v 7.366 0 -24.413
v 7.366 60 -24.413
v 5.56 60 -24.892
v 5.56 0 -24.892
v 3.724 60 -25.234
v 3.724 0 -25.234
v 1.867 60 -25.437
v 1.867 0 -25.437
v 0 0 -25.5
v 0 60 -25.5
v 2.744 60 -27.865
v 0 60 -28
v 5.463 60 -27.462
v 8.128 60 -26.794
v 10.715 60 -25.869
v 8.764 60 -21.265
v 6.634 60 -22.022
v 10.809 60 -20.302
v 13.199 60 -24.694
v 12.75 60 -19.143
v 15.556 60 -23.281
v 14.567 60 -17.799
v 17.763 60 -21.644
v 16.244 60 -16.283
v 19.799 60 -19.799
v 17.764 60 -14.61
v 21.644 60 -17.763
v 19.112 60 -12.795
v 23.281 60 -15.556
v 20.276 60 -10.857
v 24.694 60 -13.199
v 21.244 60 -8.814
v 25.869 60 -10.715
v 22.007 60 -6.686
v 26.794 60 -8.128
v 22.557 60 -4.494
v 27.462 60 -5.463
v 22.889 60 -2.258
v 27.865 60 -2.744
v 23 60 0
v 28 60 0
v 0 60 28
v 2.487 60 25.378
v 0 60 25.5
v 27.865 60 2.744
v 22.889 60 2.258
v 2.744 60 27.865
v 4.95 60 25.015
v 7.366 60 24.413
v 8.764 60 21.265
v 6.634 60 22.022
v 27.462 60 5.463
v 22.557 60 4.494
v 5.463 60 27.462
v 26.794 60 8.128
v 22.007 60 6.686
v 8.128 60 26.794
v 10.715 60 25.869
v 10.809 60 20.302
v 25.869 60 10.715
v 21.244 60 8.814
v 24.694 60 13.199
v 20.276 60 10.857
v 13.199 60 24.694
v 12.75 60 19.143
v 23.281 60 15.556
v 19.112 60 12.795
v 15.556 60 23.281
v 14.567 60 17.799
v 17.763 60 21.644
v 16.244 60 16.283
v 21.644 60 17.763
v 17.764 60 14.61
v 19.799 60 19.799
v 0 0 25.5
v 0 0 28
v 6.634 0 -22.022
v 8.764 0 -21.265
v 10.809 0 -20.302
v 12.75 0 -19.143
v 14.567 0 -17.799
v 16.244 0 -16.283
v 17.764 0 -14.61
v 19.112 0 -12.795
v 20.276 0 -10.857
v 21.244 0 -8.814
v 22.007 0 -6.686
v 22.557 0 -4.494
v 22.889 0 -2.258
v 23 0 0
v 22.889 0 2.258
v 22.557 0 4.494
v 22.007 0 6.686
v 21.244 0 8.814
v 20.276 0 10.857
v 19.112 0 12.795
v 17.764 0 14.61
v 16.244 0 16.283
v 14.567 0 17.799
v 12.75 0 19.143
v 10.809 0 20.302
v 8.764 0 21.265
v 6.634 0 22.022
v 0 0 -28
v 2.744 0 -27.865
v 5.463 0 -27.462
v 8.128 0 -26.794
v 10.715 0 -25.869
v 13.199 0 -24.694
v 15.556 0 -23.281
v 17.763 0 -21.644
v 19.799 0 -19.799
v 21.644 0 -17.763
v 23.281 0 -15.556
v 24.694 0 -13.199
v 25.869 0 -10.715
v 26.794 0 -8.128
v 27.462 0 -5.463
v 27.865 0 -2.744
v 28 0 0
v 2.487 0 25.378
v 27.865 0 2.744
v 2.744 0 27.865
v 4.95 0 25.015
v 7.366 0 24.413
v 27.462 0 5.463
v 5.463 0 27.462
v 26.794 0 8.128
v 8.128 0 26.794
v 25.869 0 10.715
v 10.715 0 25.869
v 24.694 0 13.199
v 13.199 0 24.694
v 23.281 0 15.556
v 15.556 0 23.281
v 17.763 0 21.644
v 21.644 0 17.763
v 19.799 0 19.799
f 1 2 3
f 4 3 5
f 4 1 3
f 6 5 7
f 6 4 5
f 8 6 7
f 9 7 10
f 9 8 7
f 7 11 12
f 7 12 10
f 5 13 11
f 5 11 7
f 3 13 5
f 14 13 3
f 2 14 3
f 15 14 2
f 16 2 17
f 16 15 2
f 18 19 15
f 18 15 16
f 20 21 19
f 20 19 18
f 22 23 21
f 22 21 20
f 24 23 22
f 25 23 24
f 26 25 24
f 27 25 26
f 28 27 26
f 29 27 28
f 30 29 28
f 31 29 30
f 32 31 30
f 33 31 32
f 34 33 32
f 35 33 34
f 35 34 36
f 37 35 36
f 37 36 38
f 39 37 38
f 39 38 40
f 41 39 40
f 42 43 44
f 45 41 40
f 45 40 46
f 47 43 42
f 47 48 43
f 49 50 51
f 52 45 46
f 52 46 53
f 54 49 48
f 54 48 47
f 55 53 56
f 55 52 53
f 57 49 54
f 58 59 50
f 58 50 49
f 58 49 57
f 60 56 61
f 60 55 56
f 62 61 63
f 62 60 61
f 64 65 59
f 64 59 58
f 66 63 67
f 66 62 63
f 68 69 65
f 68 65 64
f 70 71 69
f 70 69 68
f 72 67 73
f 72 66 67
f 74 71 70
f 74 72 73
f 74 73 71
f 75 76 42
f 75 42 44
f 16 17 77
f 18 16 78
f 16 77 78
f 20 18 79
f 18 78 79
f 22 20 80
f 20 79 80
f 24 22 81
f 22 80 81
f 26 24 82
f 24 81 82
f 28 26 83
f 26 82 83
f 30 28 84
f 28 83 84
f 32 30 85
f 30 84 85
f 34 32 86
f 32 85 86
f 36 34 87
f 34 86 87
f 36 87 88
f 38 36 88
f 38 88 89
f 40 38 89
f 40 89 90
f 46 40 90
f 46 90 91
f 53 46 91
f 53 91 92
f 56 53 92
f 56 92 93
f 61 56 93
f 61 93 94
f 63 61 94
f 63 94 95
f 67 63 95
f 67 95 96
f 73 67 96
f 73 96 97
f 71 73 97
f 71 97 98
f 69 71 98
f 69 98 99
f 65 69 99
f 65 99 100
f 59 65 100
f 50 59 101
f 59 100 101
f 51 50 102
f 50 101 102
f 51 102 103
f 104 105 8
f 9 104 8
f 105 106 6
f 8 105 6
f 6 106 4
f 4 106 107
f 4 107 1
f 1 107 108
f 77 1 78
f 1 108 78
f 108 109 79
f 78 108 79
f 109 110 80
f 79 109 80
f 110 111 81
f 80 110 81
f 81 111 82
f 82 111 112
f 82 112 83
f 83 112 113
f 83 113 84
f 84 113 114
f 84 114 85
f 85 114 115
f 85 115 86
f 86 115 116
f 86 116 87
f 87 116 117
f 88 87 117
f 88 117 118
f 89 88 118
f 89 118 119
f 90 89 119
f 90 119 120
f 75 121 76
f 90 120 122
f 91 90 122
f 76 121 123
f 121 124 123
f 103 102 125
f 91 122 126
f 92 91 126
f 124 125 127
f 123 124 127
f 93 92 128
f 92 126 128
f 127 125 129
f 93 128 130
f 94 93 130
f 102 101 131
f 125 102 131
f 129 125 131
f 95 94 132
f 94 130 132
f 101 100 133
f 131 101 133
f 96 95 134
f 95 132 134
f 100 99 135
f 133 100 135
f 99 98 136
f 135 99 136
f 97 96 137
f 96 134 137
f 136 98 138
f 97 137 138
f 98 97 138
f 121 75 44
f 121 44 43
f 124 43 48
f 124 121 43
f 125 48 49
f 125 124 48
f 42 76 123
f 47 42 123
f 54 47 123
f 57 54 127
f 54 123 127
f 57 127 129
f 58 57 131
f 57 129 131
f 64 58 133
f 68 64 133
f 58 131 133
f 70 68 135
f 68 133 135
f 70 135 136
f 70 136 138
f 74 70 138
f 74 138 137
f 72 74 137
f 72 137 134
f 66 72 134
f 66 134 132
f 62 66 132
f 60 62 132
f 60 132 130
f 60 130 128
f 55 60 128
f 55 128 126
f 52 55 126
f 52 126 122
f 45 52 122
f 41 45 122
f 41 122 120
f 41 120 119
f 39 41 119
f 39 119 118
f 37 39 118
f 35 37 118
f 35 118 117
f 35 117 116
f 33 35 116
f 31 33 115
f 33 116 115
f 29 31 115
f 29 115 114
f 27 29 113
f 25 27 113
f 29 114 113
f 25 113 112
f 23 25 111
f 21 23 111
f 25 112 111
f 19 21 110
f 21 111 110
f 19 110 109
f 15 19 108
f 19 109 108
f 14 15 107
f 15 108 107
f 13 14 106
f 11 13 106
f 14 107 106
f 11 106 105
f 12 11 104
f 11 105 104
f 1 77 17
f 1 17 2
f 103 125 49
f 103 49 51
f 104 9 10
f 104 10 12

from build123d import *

# Parameters (mm, degrees)
SKETCH2_R           = 28
BOSS_EXTRUDE1_DEPTH = 60
SKETCH3_R           = 23
CUT_EXTRUDE2_DEPTH  = 72.888803022
CUT_EXTRUDE3_DEPTH  = 72.888803022


with BuildPart() as part:
    # Sketch2 → Boss-Extrude1 (new body)
    with BuildSketch(Plane(origin=(0, 0, 0), x_dir=(1, 0, 0), z_dir=(0, 1, 0))):
        with Locations(Location((0, 0, 0), (0, 0, 270))):
            Circle(SKETCH2_R)
    extrude(amount=BOSS_EXTRUDE1_DEPTH)

    # Sketch3 → Cut-Extrude2 (cut, through all)
    with BuildSketch(Plane.XZ):
        with Locations(Location((0, 0, 0), (0, 0, 270))):
            Circle(SKETCH3_R)
    extrude(amount=-CUT_EXTRUDE2_DEPTH, mode=Mode.SUBTRACT)

    # Sketch5 → Cut-Extrude3 (cut, through all)
    with BuildSketch(Plane.XZ):
        with BuildLine():
            Line((0, 28), (0, 25.5))
            ThreePointArc((0, 25.5), (3.722882581, 25.226774373), (7.365985795, 24.412952572))
            Line((7.365985795, 24.412952572), (6.634014205, 22.022485226))
            ThreePointArc((6.634014205, 22.022485226), (-23.141150891, 0), (6.634014205, -22.022485226))
            Line((6.634014205, -22.022485226), (7.365978971, -24.412930285))
            ThreePointArc((7.365978971, -24.412930285), (3.723999827, -25.234351011), (0, -25.5))
            Line((0, -25.5), (0, -28))
            ThreePointArc((0, -28), (-28, 0), (0, 28))
        make_face()
    extrude(amount=-CUT_EXTRUDE3_DEPTH, mode=Mode.SUBTRACT)


with BuildPart() as body_2:
    # of the pieces the cut leaves, the one that is kept (cut_extrude3_keep)
    add(part.part.solids().sort_by_distance((0, 0, 28))[0])


solid = body_2.part
